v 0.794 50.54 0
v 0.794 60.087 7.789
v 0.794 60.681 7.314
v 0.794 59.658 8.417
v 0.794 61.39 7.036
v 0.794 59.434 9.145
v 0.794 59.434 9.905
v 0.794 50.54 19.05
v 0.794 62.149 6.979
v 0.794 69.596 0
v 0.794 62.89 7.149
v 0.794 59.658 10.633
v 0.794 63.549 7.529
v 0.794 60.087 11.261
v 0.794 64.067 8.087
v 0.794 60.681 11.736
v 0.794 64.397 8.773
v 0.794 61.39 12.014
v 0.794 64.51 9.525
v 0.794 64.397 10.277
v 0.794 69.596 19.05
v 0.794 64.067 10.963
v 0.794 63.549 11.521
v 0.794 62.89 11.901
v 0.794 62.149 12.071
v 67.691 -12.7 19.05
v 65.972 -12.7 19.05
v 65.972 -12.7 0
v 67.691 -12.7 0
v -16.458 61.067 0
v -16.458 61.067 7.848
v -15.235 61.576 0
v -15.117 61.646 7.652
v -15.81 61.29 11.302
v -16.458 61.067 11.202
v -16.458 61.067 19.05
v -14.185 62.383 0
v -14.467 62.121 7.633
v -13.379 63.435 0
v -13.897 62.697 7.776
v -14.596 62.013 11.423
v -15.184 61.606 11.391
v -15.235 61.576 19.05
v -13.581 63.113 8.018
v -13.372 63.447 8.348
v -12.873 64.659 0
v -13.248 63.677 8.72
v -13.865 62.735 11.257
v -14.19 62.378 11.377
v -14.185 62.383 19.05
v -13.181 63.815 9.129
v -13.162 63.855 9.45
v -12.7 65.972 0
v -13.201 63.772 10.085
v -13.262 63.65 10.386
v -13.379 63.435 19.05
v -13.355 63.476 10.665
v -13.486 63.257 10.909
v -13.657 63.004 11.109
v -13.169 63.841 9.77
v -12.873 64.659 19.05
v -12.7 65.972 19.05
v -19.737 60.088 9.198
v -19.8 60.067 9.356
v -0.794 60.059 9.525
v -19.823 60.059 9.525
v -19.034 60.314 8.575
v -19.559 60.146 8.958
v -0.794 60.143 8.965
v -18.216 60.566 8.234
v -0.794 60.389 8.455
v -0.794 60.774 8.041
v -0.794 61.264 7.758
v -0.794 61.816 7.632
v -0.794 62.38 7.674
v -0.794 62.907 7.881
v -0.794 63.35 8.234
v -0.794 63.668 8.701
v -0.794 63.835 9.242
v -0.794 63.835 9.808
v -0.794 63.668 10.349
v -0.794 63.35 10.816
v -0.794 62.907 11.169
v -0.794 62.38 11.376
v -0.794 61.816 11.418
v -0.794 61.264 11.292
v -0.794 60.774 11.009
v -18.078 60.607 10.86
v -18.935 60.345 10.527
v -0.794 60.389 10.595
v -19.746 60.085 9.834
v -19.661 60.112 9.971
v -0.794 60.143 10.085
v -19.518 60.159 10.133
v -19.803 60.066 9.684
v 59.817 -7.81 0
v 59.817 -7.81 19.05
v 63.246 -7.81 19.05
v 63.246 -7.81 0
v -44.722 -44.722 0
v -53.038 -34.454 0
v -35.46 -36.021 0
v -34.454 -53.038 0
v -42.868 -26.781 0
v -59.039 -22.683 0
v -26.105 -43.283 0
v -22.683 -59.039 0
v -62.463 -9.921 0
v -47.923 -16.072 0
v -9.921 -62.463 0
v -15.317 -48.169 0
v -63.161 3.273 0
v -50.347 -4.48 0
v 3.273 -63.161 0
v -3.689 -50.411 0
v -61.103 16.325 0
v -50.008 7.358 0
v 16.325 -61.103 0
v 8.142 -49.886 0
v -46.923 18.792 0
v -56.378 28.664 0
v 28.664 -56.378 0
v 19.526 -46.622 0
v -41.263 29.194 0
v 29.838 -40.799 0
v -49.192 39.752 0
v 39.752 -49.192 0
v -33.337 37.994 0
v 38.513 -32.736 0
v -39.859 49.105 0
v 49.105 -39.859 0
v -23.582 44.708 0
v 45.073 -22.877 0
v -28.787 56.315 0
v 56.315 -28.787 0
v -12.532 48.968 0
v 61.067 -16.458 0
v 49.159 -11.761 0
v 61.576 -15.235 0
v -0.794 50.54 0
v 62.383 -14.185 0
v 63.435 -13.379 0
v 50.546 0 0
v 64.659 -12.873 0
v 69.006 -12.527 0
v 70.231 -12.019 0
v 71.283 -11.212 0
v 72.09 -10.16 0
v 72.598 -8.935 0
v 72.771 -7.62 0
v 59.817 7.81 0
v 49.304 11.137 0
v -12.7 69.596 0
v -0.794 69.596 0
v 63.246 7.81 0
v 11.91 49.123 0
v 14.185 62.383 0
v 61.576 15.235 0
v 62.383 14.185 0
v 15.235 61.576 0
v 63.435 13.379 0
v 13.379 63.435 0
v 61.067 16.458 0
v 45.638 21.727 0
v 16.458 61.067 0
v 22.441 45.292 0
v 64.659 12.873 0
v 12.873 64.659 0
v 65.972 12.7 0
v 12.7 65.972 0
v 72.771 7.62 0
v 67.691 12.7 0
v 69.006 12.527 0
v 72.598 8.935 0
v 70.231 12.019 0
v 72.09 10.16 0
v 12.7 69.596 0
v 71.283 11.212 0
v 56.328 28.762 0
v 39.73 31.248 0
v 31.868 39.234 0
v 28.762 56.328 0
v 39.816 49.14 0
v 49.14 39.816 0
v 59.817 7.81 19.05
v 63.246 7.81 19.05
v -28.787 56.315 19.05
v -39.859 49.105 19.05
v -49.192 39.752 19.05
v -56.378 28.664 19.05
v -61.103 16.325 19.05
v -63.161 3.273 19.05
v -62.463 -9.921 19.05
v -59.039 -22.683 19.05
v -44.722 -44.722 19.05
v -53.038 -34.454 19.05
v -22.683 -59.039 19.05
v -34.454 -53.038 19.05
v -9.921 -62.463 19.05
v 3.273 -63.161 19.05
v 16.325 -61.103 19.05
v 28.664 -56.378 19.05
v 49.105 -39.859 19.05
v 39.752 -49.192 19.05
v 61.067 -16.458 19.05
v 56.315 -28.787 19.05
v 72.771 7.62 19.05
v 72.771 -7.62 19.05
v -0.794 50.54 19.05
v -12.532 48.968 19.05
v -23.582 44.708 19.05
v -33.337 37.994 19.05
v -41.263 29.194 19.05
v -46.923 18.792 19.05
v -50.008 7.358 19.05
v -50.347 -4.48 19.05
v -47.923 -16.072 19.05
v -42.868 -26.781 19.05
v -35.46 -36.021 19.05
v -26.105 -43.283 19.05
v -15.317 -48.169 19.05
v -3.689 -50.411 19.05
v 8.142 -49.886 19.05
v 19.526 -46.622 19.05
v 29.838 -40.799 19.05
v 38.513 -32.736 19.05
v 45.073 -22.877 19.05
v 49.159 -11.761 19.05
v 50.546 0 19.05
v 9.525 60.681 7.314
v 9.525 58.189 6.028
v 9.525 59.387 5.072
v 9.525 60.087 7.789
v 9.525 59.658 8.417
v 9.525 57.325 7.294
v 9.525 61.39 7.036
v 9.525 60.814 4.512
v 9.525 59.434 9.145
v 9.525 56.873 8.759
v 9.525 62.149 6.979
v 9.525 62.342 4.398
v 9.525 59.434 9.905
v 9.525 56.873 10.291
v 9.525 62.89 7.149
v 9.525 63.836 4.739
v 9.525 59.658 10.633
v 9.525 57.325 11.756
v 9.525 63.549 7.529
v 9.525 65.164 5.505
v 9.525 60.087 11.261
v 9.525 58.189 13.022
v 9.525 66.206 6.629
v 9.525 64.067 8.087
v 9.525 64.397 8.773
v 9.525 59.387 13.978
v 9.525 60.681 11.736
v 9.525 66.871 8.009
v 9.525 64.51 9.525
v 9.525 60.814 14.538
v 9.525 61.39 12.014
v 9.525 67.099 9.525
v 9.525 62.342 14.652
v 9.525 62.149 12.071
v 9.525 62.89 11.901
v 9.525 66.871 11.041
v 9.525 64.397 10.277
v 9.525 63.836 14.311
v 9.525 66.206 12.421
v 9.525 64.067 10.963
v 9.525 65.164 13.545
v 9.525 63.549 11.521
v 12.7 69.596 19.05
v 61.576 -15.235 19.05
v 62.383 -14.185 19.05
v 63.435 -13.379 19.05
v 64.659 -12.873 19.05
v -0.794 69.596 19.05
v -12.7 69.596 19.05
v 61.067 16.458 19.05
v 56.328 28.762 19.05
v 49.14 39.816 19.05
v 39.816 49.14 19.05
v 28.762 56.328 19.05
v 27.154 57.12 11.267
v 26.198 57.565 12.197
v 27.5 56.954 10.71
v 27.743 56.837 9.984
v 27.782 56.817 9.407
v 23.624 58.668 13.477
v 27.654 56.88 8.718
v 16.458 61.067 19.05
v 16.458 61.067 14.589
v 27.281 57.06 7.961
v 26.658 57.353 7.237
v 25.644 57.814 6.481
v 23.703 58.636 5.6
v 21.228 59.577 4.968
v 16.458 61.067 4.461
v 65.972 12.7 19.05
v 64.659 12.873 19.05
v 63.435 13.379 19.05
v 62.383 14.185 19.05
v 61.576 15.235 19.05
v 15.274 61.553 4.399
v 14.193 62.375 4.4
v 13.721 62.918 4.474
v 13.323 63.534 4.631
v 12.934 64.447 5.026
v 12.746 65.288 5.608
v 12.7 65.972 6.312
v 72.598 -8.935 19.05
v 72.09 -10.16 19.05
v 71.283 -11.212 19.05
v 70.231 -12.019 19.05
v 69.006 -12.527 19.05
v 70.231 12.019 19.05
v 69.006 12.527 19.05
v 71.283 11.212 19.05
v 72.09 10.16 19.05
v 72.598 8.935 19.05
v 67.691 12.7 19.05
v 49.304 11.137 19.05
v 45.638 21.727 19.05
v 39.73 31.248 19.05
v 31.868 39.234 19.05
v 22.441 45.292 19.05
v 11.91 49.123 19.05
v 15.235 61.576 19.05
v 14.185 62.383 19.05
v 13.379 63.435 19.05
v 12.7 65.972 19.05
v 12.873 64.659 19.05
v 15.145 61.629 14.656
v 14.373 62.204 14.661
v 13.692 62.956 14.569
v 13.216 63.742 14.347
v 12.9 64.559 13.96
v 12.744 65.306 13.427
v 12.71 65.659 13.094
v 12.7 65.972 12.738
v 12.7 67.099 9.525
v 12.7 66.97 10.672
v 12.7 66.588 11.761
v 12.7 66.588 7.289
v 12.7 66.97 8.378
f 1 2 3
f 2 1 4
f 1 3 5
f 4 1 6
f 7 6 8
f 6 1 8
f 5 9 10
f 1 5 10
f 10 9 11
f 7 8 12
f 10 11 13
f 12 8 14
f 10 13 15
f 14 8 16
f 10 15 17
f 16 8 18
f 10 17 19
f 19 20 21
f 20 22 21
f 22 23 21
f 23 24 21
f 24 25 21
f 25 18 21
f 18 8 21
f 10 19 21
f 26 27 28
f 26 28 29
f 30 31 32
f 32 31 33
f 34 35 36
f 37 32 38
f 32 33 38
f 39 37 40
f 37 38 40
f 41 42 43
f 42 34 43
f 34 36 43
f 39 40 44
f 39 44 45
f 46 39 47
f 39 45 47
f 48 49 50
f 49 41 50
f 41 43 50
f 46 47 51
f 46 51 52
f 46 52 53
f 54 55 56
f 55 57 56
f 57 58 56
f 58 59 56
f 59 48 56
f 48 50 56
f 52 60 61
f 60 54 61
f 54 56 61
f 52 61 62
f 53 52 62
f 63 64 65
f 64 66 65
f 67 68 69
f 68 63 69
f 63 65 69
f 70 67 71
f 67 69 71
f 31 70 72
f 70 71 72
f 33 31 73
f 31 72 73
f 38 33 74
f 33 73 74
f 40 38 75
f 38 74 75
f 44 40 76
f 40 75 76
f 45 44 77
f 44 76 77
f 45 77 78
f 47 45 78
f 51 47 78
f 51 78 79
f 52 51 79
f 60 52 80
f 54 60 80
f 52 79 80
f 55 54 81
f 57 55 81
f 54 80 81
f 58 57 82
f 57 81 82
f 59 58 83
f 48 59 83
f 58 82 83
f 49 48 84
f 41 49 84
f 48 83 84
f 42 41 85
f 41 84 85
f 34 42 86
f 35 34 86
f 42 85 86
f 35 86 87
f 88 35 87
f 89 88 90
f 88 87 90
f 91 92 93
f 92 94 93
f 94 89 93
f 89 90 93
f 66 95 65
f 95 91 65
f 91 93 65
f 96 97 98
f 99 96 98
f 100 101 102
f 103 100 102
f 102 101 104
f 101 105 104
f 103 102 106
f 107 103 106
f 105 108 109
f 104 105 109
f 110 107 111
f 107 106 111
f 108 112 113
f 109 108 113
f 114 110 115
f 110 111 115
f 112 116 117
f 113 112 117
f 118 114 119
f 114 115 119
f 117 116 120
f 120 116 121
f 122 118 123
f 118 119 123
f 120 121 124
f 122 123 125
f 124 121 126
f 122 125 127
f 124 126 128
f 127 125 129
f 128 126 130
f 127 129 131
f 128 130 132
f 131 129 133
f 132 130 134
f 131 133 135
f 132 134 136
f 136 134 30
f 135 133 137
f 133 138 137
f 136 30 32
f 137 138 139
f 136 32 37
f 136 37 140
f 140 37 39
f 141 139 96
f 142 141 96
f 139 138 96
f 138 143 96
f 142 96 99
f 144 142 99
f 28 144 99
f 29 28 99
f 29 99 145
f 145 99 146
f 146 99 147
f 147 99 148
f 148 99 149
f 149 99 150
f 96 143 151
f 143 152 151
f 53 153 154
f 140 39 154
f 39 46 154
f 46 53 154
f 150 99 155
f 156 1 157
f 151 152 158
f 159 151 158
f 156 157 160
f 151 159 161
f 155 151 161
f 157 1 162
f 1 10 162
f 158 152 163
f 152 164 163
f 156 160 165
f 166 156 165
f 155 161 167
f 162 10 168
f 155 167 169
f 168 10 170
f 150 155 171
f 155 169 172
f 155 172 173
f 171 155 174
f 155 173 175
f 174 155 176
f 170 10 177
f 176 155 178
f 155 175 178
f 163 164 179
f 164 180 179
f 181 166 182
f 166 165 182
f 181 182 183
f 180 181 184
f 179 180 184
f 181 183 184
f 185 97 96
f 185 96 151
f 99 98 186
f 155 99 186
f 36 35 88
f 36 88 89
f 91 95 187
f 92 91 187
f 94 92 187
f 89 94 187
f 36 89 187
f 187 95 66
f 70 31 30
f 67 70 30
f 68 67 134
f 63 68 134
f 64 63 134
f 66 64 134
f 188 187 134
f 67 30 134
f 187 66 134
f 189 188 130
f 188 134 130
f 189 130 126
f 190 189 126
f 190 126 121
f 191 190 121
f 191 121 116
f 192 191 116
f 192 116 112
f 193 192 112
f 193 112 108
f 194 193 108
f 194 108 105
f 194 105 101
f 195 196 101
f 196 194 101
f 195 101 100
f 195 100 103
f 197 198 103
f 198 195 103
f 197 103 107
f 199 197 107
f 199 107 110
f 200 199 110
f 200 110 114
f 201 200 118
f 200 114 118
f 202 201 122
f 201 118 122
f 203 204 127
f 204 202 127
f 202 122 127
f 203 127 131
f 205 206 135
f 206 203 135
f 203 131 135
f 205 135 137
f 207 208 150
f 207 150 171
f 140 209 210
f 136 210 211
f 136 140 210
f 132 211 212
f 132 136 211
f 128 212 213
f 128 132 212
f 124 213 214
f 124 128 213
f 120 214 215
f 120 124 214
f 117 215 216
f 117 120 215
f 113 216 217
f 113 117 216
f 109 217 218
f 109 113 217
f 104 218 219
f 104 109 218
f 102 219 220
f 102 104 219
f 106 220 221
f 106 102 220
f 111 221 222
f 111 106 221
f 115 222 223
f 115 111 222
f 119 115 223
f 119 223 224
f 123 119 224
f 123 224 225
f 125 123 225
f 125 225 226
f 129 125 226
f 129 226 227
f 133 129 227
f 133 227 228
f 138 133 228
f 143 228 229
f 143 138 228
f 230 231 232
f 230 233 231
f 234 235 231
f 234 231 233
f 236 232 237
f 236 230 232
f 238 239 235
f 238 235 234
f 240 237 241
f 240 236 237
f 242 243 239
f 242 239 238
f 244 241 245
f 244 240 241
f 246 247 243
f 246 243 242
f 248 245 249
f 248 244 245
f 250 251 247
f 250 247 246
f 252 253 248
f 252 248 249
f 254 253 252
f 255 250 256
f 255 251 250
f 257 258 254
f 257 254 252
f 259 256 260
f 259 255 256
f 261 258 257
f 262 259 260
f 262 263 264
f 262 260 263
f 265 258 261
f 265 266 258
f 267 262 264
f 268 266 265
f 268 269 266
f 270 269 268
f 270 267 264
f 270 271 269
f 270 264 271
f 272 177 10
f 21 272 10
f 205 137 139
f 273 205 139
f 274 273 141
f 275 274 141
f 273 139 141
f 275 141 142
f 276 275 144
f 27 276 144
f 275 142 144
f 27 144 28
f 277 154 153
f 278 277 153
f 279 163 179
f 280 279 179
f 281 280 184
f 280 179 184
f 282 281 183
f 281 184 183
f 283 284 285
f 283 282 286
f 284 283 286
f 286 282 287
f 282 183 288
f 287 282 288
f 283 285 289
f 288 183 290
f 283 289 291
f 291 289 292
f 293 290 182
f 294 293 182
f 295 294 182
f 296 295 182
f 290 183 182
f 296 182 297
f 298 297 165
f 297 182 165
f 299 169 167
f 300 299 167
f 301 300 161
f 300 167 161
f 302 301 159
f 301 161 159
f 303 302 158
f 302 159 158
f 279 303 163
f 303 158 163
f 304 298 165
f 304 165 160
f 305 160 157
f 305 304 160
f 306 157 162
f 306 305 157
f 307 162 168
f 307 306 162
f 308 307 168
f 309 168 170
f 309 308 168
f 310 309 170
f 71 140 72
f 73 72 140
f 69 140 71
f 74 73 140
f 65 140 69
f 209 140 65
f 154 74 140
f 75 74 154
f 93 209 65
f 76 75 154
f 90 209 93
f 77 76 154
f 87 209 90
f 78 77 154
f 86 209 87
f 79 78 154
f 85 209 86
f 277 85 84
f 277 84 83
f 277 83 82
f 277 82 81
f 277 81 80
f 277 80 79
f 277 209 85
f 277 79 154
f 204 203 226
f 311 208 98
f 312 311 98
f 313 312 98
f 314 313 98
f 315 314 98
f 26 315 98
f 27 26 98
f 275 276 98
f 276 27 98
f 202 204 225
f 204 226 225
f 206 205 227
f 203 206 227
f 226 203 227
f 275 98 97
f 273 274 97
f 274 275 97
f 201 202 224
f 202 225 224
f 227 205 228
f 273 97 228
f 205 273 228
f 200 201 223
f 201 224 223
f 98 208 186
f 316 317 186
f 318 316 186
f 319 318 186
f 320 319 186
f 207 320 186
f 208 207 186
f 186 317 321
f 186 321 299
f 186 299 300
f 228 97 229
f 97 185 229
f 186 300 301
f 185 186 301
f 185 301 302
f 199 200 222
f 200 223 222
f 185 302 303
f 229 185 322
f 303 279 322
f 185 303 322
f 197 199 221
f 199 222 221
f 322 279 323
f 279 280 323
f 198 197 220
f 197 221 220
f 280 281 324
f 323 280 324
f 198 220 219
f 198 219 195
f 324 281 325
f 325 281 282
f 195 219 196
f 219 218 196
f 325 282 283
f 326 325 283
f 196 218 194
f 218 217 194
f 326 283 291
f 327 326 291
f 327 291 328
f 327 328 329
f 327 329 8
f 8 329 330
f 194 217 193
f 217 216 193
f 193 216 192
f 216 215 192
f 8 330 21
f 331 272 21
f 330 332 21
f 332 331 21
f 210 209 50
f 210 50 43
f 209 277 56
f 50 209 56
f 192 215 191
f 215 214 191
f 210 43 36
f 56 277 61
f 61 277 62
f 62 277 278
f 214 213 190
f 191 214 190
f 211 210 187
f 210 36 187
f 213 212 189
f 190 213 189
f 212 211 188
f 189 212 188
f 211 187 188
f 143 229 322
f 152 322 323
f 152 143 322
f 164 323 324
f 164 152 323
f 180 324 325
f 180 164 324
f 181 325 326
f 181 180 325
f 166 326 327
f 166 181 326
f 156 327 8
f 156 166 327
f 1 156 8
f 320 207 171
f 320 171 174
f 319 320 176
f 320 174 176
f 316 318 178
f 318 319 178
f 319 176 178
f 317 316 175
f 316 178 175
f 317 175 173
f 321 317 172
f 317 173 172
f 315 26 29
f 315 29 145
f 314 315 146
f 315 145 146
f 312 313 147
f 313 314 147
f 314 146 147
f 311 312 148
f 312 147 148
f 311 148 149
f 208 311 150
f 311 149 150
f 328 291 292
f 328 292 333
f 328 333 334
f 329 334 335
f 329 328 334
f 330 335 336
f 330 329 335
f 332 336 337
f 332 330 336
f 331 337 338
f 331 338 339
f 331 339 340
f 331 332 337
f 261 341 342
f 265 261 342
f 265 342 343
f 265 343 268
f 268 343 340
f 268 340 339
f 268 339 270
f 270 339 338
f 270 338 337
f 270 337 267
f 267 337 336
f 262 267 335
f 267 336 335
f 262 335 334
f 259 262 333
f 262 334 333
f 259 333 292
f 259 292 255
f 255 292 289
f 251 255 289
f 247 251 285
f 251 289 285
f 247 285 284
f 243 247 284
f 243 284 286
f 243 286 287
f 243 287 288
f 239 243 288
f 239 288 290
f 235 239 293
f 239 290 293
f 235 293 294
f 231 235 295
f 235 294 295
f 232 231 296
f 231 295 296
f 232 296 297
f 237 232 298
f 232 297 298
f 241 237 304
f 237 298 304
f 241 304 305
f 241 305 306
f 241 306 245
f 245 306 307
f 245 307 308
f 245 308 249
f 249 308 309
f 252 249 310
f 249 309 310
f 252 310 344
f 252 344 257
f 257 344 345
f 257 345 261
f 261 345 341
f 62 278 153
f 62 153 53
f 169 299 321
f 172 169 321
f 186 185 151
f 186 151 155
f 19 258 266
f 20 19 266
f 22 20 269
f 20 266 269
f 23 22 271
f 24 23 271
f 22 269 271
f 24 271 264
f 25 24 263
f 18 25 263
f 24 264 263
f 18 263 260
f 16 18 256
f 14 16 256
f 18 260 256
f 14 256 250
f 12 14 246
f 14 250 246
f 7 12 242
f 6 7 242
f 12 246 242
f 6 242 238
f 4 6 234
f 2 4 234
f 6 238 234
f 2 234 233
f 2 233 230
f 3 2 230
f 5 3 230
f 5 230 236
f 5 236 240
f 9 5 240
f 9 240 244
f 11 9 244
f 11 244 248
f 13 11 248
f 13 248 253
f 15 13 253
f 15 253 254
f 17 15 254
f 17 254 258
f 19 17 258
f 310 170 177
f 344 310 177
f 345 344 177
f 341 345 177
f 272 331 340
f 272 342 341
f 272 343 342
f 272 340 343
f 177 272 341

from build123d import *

# Parameters (mm, degrees)
F0_R          = 63.246
F0_R_2        = 50.546
F1_DEPTH      = 19.05
F3_DEPTH      = 19.05
F4_W          = 1.5875
F4_H          = 19.0562327178
F5_DEPTH      = 19.051
F6_R          = 2.5527
F7_DEPTH      = 11.90625
F8_R          = 5.1417133043
F9_DEPTH      = 3.175
F9_DEPTH_BACK = 50.547
F11_D         = 3.7973
F12_W         = 22.225
F12_H         = 25.4
F13_DEPTH     = 19.05
F14_W         = 3.429
F14_H         = 15.621
F15_DEPTH     = 19.0510001
F16_T1_DEPTH  = 19.05
F16_T6_DEPTH  = 14.4190086939
F16_S7_R      = 5.1417133043
F16_T8_DEPTH  = 9
F16_T12_DEPTH = 14.4190086939
F16_S13_R     = 5.1417133043
F16_T14_DEPTH = 9
F16_T18_DEPTH = 17.6620719982
F16_S19_R     = 1.89865
F16_T20_DEPTH = 11
F16_T24_DEPTH = 17.6620719982
F16_S25_R     = 1.89865
F16_T26_DEPTH = 11
F16_T27_DEPTH = 44.45


# Not quite as in the source:
# - a fillet or chamfer that OpenCascade refuses, or shapes differently, is made with other operations: its cross-section is extruded or revolved along the edge and cut away or added


with BuildPart() as f1:
    # F0 (on Top) → F1 (new body)
    with BuildSketch(Plane.XY):
        Circle(F0_R)
        Circle(F0_R_2, mode=Mode.SUBTRACT)
    extrude(amount=F1_DEPTH)

    # F2 (on face) → F3 (join)
    with BuildSketch(Plane.XY.offset(19.05)):
        with BuildLine():
            Line((12.7, 69.596), (-12.7, 69.596))
            Line((-12.7, 69.596), (-12.7, 61.9577801087))
            ThreePointArc((-12.7, 61.9577801087), (0, 63.246), (12.7, 61.9577801087))
            Line((12.7, 61.9577801087), (12.7, 69.596))
        make_face()
    extrude(amount=-F3_DEPTH)

    # F4 (on face) → F5 (cut, through all)
    with BuildSketch(Plane.XY.offset(19.05)):
        with Locations((0, 60.0678836411)):
            Rectangle(F4_W, F4_H)
    extrude(amount=-F5_DEPTH, mode=Mode.SUBTRACT)

    # F6 (on face) → F7 (cut, through all)
    with BuildSketch(Plane.YZ.offset(12.7)):
        with Locations((61.9577801087, 9.525)):
            Circle(F6_R)
    extrude(amount=-F7_DEPTH, mode=Mode.SUBTRACT)

    # F8 (on face) → F9 (cut, two sides)
    with BuildSketch(Plane.YZ.offset(12.7)) as f9_sk:
        with Locations((61.9577801087, 9.525)):
            Circle(F8_R)
    extrude(amount=-F9_DEPTH, mode=Mode.SUBTRACT)
    extrude(f9_sk.sketch, amount=F9_DEPTH_BACK, mode=Mode.SUBTRACT)

    # F11 (through all)
    with Locations(Plane.YZ.offset(-0.79375)):
        with Locations((61.9577801087, 9.525)):
            Hole(F11_D / 2)

    # F12 (on face) → F13 (join)
    with BuildSketch(Plane.XY.offset(19.05)):
        with Locations((61.6585, 0)):
            Rectangle(F12_W, F12_H)
    extrude(amount=-F13_DEPTH)

    # F14 (on face) → F15 (cut, through all)
    with BuildSketch(Plane.XY.offset(19.05)):
        with Locations((61.5315, 0)):
            Rectangle(F14_W, F14_H)
    extrude(amount=-F15_DEPTH, mode=Mode.SUBTRACT)

    # F16: fillet of radius 5.08 on 8 edges, made by hand

    # F16_s2 → F16_t1 (join)
    with BuildSketch(Plane.XY):
        with BuildLine():
            ThreePointArc((61.0670823721, -16.4580669145), (62.882491273, -13.7475181293), (65.972068908, -12.7))
            Line((65.972068908, -12.7), (61.9577801087, -12.7))
            ThreePointArc((61.9577801087, -12.7), (61.5411241678, -14.585833955), (61.0670823721, -16.4580669145))
        make_face()
        with BuildLine():
            ThreePointArc((65.972068908, 12.7), (62.882491273, 13.7475181293), (61.0670823721, 16.4580669145))
            ThreePointArc((61.0670823721, 16.4580669145), (61.5411241678, 14.585833955), (61.9577801087, 12.7))
            Line((61.9577801087, 12.7), (65.972068908, 12.7))
        make_face()
    extrude(amount=F16_T1_DEPTH)


with BuildPart() as f16_tool4:
    # F16_s5 → F16_t6 (new body)
    with BuildSketch(Plane.XY.offset(19.05)):
        with BuildLine():
            ThreePointArc((16.4580669145, 61.0670823721), (13.7475181293, 62.882491273), (12.7, 65.972068908))
            Line((12.7, 65.972068908), (12.7, 61.9577801087))
            ThreePointArc((12.7, 61.9577801087), (14.585833955, 61.5411241678), (16.4580669145, 61.0670823721))
        make_face()
    extrude(amount=-F16_T6_DEPTH)

    # F16_s7 → F16_t8 (cut, symmetric)
    with BuildSketch(Plane.YZ.offset(14.6)):
        with Locations((61.9577801087, 9.525)):
            Circle(F16_S7_R)
    extrude(amount=F16_T8_DEPTH, both=True, mode=Mode.SUBTRACT)


with BuildPart() as f1_1:
    add(f1.part)

    # F16_t3: union F16_tool4
    add(f16_tool4.part)


with BuildPart() as f16_tool10:
    # F16_s11 → F16_t12 (new body)
    with BuildSketch(Plane.XY.offset(14.4190086939)):
        with BuildLine():
            ThreePointArc((16.4580669145, 61.0670823721), (13.7475181293, 62.882491273), (12.7, 65.972068908))
            Line((12.7, 65.972068908), (12.7, 61.9577801087))
            ThreePointArc((12.7, 61.9577801087), (14.585833955, 61.5411241678), (16.4580669145, 61.0670823721))
        make_face()
    extrude(amount=-F16_T12_DEPTH)

    # F16_s13 → F16_t14 (cut, symmetric)
    with BuildSketch(Plane.YZ.offset(14.6)):
        with Locations((61.9577801087, 9.525)):
            Circle(F16_S13_R)
    extrude(amount=F16_T14_DEPTH, both=True, mode=Mode.SUBTRACT)


with BuildPart() as f1_2:
    add(f1_1.part)

    # F16_t9: union F16_tool10
    add(f16_tool10.part)


with BuildPart() as f16_tool16:
    # F16_s17 → F16_t18 (new body)
    with BuildSketch(Plane.XY.offset(19.05)):
        with BuildLine():
            ThreePointArc((-16.4580669145, 61.0670823721), (-13.7475181293, 62.882491273), (-12.7, 65.972068908))
            Line((-12.7, 65.972068908), (-12.7, 61.9577801087))
            ThreePointArc((-12.7, 61.9577801087), (-14.585833955, 61.5411241678), (-16.4580669145, 61.0670823721))
        make_face()
    extrude(amount=-F16_T18_DEPTH)

    # F16_s19 → F16_t20 (cut, symmetric)
    with BuildSketch(Plane.YZ.offset(-14.6)):
        with Locations((61.9577801087, 9.525)):
            Circle(F16_S19_R)
    extrude(amount=F16_T20_DEPTH, both=True, mode=Mode.SUBTRACT)


with BuildPart() as f1_3:
    add(f1_2.part)

    # F16_t15: union F16_tool16
    add(f16_tool16.part)


with BuildPart() as f16_tool22:
    # F16_s23 → F16_t24 (new body)
    with BuildSketch(Plane.XY.offset(17.6620719982)):
        with BuildLine():
            ThreePointArc((-16.4580669145, 61.0670823721), (-13.7475181293, 62.882491273), (-12.7, 65.972068908))
            Line((-12.7, 65.972068908), (-12.7, 61.9577801087))
            ThreePointArc((-12.7, 61.9577801087), (-14.585833955, 61.5411241678), (-16.4580669145, 61.0670823721))
        make_face()
    extrude(amount=-F16_T24_DEPTH)

    # F16_s25 → F16_t26 (cut, symmetric)
    with BuildSketch(Plane.YZ.offset(-14.6)):
        with Locations((61.9577801087, 9.525)):
            Circle(F16_S25_R)
    extrude(amount=F16_T26_DEPTH, both=True, mode=Mode.SUBTRACT)


with BuildPart() as f1_4:
    add(f1_3.part)

    # F16_t21: union F16_tool22
    add(f16_tool22.part)

    # F16_s28 → F16_t27 (cut)
    with BuildSketch(Plane.XY.offset(-12.7)):
        with BuildLine():
            ThreePointArc((67.691, -12.7), (71.2831024484, -11.2121024484), (72.771, -7.62))
            Line((72.771, -7.62), (72.771, -12.7))
            Line((72.771, -12.7), (67.691, -12.7))
        make_face()
        with BuildLine():
            ThreePointArc((72.771, 7.62), (71.2831024484, 11.2121024484), (67.691, 12.7))
            Line((67.691, 12.7), (72.771, 12.7))
            Line((72.771, 12.7), (72.771, 7.62))
        make_face()
    extrude(amount=F16_T27_DEPTH, mode=Mode.SUBTRACT)


solid = f1_4.part
